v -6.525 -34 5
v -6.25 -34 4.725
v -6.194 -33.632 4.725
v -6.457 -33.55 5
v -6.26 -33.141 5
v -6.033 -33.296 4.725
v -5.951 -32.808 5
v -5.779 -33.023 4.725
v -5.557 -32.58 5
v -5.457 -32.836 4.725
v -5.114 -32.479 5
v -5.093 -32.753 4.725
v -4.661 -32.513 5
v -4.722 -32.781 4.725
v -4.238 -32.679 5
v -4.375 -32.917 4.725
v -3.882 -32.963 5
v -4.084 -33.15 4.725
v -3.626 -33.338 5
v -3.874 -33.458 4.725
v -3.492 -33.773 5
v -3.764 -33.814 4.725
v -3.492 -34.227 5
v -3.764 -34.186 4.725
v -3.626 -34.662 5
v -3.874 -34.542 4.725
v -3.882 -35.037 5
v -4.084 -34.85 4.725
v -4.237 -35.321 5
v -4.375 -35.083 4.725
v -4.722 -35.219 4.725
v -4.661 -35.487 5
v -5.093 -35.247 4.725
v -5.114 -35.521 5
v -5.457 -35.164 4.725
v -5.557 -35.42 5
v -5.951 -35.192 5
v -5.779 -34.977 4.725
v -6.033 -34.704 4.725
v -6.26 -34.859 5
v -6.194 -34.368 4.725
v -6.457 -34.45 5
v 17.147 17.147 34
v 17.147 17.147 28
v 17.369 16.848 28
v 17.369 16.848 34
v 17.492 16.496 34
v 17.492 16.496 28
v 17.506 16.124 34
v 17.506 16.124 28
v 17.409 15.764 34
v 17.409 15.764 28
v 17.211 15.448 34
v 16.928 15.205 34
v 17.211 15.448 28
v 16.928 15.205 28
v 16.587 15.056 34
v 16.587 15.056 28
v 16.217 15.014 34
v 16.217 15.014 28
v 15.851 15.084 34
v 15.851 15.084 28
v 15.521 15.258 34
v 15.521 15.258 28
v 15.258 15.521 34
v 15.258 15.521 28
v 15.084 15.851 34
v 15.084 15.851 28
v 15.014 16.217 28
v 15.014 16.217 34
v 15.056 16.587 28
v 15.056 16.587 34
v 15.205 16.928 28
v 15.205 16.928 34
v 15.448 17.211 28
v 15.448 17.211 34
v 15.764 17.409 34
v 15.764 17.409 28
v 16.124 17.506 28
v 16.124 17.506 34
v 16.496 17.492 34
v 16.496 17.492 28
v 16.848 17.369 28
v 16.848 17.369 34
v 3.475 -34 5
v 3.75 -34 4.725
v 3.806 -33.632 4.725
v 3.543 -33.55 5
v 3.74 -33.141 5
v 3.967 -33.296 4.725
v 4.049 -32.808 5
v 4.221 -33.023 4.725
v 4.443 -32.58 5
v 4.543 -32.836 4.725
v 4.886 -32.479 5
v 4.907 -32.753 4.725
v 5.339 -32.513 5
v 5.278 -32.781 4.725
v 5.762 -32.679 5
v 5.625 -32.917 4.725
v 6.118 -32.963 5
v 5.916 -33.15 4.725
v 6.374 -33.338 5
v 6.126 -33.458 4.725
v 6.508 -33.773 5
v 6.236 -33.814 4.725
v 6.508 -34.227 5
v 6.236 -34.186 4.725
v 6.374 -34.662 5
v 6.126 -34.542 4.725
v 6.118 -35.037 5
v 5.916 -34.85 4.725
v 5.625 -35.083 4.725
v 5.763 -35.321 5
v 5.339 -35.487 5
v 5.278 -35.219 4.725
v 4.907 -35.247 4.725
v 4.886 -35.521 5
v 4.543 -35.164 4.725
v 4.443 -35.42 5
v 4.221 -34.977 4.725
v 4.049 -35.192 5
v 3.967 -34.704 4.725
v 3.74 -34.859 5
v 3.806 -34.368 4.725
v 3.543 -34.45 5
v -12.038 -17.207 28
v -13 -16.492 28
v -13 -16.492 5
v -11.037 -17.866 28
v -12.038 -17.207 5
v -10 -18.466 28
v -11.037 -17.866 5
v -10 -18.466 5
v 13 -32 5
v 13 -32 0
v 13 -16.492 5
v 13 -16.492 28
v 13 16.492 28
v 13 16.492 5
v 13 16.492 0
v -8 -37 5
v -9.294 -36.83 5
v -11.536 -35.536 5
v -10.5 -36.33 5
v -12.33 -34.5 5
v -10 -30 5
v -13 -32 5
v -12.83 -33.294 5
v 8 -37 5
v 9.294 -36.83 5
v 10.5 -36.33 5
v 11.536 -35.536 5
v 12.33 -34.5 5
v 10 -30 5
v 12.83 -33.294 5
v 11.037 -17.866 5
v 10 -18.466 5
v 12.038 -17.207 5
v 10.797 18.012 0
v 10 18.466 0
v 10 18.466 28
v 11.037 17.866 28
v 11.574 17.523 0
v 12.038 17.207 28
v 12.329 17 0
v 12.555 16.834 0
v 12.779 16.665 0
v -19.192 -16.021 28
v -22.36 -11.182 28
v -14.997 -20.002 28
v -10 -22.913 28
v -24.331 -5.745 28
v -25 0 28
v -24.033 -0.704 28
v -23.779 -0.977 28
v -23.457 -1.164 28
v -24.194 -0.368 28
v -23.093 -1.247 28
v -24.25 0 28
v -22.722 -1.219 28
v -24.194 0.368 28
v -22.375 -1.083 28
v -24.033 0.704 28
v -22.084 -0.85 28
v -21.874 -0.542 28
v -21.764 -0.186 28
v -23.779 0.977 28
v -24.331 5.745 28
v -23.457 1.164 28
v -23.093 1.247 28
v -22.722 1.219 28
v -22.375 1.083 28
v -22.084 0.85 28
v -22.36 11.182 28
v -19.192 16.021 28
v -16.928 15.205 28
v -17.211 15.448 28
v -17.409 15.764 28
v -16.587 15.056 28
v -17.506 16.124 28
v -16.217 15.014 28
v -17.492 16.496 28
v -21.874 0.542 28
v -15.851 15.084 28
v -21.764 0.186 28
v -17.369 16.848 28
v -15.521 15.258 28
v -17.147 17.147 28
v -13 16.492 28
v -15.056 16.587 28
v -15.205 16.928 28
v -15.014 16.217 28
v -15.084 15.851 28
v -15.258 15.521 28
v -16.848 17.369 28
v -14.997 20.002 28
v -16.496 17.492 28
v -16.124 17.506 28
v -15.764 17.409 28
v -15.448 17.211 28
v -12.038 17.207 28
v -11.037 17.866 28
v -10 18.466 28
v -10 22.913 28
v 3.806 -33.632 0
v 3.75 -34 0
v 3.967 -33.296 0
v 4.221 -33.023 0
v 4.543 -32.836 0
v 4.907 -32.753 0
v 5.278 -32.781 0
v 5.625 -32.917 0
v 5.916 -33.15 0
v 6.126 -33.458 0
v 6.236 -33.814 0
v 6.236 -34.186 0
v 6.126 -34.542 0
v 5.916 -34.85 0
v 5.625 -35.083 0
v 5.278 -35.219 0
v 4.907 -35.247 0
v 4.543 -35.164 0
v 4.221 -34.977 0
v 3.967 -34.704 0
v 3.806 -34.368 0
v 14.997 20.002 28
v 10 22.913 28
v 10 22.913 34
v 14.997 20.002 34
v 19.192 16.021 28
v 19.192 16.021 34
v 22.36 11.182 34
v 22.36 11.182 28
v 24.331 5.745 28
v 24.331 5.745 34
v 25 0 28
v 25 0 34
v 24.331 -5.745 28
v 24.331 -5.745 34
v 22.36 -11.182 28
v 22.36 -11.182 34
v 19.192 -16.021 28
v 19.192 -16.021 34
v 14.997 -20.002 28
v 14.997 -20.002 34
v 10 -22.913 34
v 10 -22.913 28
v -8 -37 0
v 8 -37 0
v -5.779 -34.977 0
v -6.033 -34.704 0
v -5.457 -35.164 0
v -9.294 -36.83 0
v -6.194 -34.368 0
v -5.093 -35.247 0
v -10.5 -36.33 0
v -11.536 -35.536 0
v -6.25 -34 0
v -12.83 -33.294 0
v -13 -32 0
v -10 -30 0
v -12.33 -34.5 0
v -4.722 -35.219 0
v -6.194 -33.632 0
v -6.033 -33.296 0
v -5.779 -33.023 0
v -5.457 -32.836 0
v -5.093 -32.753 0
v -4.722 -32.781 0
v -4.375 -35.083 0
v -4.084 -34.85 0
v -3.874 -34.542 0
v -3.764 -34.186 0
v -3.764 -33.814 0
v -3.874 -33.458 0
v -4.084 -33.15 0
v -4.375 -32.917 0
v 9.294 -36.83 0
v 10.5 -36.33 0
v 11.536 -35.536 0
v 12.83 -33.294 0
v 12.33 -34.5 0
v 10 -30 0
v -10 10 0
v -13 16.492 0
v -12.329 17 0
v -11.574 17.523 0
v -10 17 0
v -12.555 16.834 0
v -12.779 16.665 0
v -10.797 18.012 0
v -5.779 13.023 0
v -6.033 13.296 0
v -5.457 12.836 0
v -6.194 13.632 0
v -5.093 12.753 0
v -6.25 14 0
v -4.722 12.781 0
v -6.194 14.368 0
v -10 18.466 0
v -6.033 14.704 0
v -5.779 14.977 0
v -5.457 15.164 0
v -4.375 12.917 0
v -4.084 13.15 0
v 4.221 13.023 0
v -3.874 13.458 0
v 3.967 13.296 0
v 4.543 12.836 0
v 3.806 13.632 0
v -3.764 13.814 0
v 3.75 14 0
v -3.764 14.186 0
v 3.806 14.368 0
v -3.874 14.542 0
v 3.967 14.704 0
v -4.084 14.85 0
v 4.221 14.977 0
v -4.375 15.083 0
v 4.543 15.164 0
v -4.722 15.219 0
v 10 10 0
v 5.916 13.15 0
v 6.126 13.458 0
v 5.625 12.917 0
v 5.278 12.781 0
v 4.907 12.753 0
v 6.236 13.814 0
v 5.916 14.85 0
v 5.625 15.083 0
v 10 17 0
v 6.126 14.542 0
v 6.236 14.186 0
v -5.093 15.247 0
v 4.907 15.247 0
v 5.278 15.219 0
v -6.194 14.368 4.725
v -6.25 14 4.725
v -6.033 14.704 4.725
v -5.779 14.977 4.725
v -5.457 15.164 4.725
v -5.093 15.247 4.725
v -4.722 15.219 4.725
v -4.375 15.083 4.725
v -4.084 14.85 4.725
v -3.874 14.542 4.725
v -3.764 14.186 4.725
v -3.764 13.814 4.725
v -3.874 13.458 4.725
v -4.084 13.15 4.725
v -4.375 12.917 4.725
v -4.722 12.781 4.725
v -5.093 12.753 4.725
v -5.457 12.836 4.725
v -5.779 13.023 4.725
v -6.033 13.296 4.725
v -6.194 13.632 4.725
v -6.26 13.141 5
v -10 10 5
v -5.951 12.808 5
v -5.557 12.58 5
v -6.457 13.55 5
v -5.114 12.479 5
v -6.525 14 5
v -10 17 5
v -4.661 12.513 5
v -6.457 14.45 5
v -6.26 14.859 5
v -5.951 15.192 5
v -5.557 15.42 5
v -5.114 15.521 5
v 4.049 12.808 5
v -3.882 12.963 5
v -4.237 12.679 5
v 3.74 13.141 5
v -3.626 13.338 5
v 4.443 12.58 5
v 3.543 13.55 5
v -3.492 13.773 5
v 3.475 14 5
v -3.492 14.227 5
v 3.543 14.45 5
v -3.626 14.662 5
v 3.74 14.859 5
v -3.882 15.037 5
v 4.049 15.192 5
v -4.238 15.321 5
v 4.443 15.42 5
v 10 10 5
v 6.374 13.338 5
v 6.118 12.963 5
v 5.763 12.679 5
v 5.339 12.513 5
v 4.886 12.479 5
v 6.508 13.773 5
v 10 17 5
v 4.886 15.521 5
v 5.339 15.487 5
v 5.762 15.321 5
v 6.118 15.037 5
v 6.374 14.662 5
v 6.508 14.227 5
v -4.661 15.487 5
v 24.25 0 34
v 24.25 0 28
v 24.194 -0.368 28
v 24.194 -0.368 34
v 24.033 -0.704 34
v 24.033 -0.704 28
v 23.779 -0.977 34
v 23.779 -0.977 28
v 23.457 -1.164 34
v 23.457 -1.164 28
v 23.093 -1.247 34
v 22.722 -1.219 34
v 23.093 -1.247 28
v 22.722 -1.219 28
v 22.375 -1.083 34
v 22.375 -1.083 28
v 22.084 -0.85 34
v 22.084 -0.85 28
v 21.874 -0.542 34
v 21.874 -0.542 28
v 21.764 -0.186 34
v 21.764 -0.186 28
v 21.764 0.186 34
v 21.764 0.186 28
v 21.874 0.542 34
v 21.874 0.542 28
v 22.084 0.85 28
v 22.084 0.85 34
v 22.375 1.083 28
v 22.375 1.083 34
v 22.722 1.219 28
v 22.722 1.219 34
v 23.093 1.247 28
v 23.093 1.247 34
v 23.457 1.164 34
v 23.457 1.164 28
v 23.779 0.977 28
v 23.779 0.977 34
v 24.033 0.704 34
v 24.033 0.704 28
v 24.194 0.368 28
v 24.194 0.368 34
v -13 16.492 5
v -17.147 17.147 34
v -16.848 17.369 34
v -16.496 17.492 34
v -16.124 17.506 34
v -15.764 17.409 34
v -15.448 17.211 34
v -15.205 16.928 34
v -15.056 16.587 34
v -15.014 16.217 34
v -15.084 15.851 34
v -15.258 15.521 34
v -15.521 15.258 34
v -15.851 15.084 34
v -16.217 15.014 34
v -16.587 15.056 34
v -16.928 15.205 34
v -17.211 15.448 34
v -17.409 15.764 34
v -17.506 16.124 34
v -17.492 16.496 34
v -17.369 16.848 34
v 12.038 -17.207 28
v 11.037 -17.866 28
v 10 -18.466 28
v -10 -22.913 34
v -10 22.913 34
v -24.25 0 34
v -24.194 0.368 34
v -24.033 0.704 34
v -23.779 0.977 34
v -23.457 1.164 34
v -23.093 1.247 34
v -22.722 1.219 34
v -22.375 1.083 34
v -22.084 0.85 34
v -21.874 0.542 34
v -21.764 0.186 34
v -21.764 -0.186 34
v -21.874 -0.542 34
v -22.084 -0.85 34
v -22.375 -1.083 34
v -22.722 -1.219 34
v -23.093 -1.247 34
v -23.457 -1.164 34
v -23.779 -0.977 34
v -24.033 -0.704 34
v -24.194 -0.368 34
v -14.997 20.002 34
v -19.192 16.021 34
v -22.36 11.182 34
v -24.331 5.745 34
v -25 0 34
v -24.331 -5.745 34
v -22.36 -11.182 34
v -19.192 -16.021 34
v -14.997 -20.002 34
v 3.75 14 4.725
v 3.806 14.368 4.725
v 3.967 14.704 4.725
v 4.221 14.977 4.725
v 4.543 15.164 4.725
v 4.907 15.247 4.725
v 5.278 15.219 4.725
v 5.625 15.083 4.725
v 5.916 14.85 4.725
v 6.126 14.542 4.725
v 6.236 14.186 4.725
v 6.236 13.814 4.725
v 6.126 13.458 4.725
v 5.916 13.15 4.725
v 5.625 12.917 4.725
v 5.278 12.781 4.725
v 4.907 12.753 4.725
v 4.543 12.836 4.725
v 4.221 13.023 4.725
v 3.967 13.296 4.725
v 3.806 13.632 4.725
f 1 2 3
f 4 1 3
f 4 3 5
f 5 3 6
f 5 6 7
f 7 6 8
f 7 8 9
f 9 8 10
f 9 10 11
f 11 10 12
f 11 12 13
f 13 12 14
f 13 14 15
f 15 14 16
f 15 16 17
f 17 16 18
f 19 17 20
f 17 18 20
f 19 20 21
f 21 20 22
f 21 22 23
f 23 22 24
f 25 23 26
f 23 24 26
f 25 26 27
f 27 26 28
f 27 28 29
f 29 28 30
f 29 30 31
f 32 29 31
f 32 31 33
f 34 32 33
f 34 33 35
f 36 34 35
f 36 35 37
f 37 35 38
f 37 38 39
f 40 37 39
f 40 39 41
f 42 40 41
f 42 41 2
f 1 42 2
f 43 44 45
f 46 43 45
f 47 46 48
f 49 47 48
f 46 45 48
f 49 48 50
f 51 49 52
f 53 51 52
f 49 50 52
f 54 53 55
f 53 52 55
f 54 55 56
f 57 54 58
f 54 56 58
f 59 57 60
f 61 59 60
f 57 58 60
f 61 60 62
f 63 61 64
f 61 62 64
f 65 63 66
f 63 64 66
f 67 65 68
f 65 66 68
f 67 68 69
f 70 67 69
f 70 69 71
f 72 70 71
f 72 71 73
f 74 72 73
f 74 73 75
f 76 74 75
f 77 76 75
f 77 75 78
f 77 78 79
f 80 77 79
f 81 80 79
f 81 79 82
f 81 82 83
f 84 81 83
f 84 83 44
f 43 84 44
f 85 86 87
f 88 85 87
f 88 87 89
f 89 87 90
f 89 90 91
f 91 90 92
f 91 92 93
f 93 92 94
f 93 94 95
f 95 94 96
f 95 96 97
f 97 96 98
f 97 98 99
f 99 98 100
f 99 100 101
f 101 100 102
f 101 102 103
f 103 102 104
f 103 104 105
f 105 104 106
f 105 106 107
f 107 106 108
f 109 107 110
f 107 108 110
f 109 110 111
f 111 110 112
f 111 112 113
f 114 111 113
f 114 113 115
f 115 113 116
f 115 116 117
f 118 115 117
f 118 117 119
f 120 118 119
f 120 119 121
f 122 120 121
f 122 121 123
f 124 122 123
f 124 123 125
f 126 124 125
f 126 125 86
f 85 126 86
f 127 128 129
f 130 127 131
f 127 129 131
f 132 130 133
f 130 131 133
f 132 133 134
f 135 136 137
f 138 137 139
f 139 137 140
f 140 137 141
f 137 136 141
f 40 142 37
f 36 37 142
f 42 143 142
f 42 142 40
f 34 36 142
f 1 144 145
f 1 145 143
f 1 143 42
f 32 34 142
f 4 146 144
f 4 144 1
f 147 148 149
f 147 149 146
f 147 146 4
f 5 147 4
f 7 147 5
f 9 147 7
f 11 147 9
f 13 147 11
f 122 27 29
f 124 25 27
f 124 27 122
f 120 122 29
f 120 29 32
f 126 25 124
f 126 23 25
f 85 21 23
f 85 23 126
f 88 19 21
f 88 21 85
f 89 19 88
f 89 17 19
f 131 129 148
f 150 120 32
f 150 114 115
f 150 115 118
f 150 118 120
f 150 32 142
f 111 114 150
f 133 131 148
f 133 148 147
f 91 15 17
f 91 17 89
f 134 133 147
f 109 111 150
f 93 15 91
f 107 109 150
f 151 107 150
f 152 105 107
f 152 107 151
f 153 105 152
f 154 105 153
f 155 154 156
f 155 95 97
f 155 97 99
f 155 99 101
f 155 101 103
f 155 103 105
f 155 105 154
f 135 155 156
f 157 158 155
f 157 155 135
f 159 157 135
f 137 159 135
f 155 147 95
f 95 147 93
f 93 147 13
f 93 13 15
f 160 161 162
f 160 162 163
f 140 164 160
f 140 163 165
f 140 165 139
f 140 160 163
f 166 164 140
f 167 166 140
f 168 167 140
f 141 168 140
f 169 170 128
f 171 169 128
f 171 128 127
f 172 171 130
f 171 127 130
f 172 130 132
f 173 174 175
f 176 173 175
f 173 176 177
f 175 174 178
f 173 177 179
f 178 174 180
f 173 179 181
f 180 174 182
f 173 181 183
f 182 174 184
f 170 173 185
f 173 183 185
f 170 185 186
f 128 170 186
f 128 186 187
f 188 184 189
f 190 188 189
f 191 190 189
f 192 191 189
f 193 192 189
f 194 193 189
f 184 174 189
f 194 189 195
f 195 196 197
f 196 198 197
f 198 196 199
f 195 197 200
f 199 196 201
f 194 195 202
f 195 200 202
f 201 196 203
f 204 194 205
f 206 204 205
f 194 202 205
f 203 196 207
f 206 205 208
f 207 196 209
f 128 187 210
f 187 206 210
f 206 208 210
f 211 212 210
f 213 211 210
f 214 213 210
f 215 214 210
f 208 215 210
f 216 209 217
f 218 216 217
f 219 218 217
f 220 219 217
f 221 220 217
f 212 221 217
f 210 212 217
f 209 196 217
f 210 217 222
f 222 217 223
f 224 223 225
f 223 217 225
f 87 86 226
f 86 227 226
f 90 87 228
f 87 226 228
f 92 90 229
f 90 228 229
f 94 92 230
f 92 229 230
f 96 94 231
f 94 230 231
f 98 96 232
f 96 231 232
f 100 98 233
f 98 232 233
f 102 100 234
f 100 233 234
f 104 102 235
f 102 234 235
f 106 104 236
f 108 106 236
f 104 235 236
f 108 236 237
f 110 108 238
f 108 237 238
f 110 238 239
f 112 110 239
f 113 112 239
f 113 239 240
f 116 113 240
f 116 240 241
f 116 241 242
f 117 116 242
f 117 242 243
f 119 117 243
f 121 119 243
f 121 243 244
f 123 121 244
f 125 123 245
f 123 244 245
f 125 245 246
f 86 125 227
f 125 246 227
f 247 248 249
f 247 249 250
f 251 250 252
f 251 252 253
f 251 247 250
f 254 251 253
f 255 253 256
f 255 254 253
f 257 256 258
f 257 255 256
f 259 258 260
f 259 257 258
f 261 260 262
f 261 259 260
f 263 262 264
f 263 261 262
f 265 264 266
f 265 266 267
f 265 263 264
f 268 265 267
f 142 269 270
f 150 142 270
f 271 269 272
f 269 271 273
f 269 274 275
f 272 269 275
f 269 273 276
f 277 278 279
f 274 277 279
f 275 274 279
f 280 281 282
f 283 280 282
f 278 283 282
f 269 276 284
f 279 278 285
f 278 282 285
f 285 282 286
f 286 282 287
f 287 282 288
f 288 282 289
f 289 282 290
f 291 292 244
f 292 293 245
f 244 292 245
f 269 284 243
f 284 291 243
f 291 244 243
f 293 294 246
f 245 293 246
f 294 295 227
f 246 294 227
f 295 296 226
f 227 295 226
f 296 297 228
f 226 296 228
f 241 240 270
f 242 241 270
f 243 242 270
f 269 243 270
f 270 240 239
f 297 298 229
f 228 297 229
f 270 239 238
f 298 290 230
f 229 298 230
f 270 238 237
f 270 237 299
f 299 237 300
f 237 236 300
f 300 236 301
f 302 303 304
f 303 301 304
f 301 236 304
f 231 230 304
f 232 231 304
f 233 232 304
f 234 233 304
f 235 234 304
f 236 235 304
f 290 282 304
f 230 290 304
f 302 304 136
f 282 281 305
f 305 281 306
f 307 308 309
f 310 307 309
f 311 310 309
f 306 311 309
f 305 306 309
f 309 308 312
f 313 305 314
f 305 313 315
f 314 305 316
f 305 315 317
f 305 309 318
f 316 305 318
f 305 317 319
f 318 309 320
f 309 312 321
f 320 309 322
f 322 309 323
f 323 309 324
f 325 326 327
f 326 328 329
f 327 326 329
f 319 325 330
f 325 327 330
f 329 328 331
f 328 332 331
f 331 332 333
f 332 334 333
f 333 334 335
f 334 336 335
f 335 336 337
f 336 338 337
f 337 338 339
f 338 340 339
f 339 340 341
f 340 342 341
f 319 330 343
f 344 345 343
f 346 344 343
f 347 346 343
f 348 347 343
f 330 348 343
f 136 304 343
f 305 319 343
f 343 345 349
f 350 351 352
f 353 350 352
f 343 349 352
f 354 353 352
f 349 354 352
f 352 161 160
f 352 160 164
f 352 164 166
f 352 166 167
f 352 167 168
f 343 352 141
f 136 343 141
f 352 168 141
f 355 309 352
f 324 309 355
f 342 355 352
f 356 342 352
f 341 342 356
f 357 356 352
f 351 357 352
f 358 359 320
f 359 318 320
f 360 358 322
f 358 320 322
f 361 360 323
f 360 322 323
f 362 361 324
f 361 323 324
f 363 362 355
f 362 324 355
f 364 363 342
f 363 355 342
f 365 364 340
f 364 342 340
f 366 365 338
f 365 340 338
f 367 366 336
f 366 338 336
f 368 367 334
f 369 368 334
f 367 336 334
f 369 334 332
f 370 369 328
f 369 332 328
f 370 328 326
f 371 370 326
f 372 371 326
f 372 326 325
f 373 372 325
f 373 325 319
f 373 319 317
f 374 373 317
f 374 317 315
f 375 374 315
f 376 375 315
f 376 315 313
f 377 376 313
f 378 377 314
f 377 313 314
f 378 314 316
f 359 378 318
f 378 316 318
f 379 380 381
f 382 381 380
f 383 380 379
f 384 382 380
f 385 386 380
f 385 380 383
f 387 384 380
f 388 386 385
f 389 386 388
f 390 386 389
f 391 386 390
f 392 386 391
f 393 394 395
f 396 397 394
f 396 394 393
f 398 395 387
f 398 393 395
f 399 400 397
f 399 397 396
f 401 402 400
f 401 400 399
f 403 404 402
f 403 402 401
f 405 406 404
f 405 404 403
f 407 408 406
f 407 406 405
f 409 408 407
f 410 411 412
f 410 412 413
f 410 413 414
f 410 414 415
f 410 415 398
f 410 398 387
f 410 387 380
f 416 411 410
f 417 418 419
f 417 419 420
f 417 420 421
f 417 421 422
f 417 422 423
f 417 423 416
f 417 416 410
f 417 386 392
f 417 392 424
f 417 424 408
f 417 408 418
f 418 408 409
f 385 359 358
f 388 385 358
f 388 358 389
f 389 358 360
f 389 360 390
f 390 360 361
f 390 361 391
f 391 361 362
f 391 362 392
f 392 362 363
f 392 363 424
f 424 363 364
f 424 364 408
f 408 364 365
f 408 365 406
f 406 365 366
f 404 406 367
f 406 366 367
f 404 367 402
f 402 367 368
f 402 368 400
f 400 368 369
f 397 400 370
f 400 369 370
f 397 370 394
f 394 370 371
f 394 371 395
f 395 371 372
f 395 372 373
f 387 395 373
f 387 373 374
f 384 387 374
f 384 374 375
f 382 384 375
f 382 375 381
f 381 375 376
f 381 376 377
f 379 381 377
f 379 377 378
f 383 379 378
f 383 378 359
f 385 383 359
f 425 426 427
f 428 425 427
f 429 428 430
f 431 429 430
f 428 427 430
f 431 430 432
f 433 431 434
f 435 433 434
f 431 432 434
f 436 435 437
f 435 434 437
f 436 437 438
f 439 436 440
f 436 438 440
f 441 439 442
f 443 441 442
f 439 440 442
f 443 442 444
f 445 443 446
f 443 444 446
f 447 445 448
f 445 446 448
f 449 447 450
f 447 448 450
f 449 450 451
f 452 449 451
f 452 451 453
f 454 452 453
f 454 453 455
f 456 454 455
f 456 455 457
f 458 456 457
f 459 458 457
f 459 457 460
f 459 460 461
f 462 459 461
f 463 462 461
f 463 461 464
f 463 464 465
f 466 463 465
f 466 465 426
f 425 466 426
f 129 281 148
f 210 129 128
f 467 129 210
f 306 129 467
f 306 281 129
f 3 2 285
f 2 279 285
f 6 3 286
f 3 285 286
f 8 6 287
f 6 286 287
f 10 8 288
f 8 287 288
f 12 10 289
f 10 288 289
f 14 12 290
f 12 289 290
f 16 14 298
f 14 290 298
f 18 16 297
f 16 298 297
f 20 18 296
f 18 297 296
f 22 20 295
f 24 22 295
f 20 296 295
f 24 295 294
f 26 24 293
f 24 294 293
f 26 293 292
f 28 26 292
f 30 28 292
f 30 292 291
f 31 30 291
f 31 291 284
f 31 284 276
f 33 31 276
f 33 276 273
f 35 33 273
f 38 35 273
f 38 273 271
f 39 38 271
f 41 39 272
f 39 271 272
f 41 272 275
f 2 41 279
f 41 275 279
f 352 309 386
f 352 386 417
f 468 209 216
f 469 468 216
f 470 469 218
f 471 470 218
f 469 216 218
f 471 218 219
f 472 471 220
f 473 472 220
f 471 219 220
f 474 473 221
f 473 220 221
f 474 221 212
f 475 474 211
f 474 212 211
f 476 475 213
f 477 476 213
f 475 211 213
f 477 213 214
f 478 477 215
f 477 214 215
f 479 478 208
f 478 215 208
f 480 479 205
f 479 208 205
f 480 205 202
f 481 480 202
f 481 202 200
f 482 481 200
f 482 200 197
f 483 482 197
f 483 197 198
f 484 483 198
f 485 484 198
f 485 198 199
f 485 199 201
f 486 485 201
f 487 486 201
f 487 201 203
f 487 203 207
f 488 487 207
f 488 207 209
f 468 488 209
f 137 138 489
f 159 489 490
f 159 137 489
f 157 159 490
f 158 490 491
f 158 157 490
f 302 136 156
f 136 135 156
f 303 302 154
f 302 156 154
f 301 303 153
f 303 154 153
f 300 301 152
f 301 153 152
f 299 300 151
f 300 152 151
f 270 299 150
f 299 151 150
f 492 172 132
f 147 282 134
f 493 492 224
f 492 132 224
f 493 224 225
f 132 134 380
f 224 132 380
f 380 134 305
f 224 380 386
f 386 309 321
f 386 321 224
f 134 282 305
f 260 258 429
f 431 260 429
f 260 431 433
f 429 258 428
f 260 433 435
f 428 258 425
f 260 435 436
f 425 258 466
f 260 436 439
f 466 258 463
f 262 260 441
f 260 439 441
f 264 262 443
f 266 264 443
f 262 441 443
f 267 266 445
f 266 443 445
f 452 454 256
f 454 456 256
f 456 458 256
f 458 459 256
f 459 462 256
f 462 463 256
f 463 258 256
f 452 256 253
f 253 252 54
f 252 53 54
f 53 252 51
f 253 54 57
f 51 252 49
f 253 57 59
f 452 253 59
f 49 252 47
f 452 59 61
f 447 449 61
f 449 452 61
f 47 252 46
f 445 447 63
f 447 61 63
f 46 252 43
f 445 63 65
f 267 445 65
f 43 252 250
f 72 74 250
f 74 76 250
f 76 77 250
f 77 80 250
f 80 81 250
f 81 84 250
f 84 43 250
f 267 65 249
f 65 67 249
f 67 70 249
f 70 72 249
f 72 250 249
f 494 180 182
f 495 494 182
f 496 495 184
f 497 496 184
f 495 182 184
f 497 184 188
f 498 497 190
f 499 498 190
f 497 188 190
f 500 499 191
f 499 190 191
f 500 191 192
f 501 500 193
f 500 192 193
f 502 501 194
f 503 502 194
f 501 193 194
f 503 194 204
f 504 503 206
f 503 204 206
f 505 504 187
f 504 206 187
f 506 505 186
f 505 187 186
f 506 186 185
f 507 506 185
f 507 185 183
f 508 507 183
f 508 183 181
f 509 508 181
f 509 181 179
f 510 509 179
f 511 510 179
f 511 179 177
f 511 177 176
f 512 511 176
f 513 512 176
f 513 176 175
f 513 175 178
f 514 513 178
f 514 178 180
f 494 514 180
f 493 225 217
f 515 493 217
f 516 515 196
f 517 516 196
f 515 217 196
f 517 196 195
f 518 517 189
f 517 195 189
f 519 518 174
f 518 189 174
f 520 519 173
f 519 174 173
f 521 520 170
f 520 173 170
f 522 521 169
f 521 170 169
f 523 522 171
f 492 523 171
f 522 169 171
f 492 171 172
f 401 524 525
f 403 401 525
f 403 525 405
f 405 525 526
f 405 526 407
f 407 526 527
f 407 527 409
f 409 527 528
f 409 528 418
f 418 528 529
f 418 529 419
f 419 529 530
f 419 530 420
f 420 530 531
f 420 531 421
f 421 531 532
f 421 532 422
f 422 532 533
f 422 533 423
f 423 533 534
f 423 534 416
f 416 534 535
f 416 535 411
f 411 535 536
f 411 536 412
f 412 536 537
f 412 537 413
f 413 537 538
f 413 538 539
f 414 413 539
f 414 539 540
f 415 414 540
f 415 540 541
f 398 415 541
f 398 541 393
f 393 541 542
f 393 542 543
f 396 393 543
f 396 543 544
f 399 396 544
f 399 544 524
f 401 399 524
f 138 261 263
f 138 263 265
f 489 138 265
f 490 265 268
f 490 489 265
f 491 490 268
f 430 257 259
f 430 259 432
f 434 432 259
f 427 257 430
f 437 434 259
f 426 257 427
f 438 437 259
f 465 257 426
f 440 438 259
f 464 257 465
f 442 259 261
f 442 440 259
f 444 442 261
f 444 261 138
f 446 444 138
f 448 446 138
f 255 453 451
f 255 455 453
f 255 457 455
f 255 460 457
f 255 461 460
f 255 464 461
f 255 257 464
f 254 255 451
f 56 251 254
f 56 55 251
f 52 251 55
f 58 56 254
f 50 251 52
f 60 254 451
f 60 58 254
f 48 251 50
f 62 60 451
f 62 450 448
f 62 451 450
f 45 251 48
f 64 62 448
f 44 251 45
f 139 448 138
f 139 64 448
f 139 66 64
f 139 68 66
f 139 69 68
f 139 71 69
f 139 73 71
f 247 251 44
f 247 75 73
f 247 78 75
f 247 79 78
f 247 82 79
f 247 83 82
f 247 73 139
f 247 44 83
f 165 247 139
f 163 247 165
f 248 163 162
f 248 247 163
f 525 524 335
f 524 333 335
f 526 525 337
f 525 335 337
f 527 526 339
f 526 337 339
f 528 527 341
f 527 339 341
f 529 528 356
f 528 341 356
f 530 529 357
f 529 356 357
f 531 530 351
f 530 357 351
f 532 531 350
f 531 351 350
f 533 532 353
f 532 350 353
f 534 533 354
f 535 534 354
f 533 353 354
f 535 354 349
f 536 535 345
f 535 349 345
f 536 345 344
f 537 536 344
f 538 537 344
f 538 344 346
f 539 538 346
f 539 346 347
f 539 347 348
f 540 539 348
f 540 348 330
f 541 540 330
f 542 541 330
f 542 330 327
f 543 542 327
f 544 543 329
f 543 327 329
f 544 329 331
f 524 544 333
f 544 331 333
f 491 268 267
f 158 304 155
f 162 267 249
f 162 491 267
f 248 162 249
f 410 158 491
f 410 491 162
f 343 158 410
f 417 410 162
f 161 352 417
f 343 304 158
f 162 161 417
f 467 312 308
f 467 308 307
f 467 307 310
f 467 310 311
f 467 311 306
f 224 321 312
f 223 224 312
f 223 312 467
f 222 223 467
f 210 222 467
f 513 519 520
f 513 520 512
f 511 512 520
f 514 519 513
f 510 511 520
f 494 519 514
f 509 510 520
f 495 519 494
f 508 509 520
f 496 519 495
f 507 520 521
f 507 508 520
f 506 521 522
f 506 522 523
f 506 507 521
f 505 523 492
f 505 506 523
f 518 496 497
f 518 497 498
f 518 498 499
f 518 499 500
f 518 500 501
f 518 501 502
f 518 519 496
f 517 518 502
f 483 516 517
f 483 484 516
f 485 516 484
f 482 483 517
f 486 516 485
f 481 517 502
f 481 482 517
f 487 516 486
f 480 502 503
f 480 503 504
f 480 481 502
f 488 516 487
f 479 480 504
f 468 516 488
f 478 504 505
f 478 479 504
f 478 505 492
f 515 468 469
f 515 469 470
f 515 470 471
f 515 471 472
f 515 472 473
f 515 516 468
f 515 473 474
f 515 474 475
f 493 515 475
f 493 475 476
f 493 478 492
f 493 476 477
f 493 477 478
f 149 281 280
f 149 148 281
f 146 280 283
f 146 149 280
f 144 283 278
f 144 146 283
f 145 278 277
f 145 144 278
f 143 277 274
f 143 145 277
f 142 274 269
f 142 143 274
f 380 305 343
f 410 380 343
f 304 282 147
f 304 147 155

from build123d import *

# Parameters (mm, degrees)
SKETCH_1_W                  = 26
SKETCH_1_H                  = 54
SKETCH_1_W_2                = 20
SKETCH_1_H_2                = 40
EXTRUDE_1_DEPTH             = 5
EXTRUDE_2_DEPTH             = 28
SKETCH_3_OUTSIDE_W          = 41.47
SKETCH_3_OUTSIDE_H          = 70.936
CUT_EXTRUDE_1_DEPTH         = 29
FILLET_1_R                  = 5
EXTRUDE_3_DEPTH             = 6
M3X0_51_D                   = 2.5
M3X0_51_CSINK_D             = 3.05
M3X0_51_CSINK_ANGLE         = 90
PATTERN_LINEAR_1_COUNT      = 2
PATTERN_LINEAR_1_PITCH      = 10
PATTERN_LINEAR_1_COUNT_DIR2 = 2
PATTERN_LINEAR_1_PITCH_DIR2 = 48
HOLE_WIZARD_1_D             = 2.5
PATTERN_CIRCULAR_1_COUNT    = 8


with BuildPart() as part:
    # Эскиз1 → Бобышка-Вытянуть1 (new body)
    with BuildSketch(Plane.XY):
        with Locations((0, -10)):
            Rectangle(SKETCH_1_W, SKETCH_1_H)
        with Locations((0, -10)):
            Rectangle(SKETCH_1_W_2, SKETCH_1_H_2, mode=Mode.SUBTRACT)
    extrude(amount=EXTRUDE_1_DEPTH)

    # Эскиз2 → Бобышка-Вытянуть2 (add)
    with BuildSketch(Plane.XY):
        with BuildLine():
            Line((10, -18.466185313), (10, 18.466185313))
            ThreePointArc((10, 18.466185313), (11.542267321, 17.543547677), (13, 16.492422502))
            Line((13, 16.492422502), (13, -16.492422502))
            ThreePointArc((13, -16.492422502), (11.542267321, -17.543547677), (10, -18.466185313))
        make_face()
        with BuildLine():
            Line((-10, -18.466185313), (-10, 18.466185313))
            ThreePointArc((-10, 18.466185313), (-11.542267321, 17.543547677), (-13, 16.492422502))
            Line((-13, 16.492422502), (-13, -16.492422502))
            ThreePointArc((-13, -16.492422502), (-11.542267321, -17.543547677), (-10, -18.466185313))
        make_face()
    extrude(amount=EXTRUDE_2_DEPTH)

    # Эскиз3 outside → Вырез-Вытянуть1 (cut, through all)
    with BuildSketch(Plane.XY.offset(28)):
        with Locations((0, -9.267)):
            Rectangle(SKETCH_3_OUTSIDE_W, SKETCH_3_OUTSIDE_H)
        with BuildLine():
            Line((-13, -16.492422502), (-13, -37))
            Line((-13, -37), (13, -37))
            Line((13, -37), (13, -16.492422502))
            ThreePointArc((13, -16.492422502), (0, 21), (-13, -16.492422502))
        make_face(mode=Mode.SUBTRACT)
    extrude(amount=-CUT_EXTRUDE_1_DEPTH, mode=Mode.SUBTRACT)

    # Скругление1
    fillet_1_edges = [part.edges().sort_by_distance(p)[0] for p in [
        (13, -37, 2.5),
        (-13, -37, 2.5),
    ]]
    fillet(fillet_1_edges, radius=FILLET_1_R)

    # Эскиз7 → Бобышка-Вытянуть3 (add)
    with BuildSketch(Plane.XY.offset(28)):
        with BuildLine():
            Line((-10, -22.912878475), (-10, 22.912878475))
            ThreePointArc((-10, 22.912878475), (-25, 0), (-10, -22.912878475))
        make_face()
        with BuildLine():
            Line((10, -22.912878475), (10, 22.912878475))
            ThreePointArc((10, 22.912878475), (25, 0), (10, -22.912878475))
        make_face()
    extrude(amount=EXTRUDE_3_DEPTH)

    # Отверстие обработанное метчиком M3x0.51 (through all)
    with Locations(Plane.XY.offset(5)):
        with Locations((-5, 14)):
            m3x0_51 = CounterSinkHole(M3X0_51_D / 2, M3X0_51_CSINK_D / 2, counter_sink_angle=M3X0_51_CSINK_ANGLE)

    # Линейный массив1: M3x0.51 2 × 2
    with Locations(*[(i * PATTERN_LINEAR_1_PITCH, -j * PATTERN_LINEAR_1_PITCH_DIR2, 0) for i in range(PATTERN_LINEAR_1_COUNT) for j in range(PATTERN_LINEAR_1_COUNT_DIR2) if (i, j) != (0, 0)]):
        add(m3x0_51, mode=Mode.SUBTRACT)

    # Отверстие1 (through all)
    with Locations(Plane.XY.offset(34)):
        with Locations((-23, 0)):
            hole_wizard_1 = Hole(HOLE_WIZARD_1_D / 2)

    # Круговой массив1: Отверстие1 ×8 about axis, 4 skipped
    pattern_circular_1_axis = Axis((0, 0, 34), (0, 0, 1))
    add([hole_wizard_1.rotate(pattern_circular_1_axis, i * 360 / PATTERN_CIRCULAR_1_COUNT) for i in range(1, PATTERN_CIRCULAR_1_COUNT) if i not in (1, 2, 3, 6)], mode=Mode.SUBTRACT)


solid = part.part
